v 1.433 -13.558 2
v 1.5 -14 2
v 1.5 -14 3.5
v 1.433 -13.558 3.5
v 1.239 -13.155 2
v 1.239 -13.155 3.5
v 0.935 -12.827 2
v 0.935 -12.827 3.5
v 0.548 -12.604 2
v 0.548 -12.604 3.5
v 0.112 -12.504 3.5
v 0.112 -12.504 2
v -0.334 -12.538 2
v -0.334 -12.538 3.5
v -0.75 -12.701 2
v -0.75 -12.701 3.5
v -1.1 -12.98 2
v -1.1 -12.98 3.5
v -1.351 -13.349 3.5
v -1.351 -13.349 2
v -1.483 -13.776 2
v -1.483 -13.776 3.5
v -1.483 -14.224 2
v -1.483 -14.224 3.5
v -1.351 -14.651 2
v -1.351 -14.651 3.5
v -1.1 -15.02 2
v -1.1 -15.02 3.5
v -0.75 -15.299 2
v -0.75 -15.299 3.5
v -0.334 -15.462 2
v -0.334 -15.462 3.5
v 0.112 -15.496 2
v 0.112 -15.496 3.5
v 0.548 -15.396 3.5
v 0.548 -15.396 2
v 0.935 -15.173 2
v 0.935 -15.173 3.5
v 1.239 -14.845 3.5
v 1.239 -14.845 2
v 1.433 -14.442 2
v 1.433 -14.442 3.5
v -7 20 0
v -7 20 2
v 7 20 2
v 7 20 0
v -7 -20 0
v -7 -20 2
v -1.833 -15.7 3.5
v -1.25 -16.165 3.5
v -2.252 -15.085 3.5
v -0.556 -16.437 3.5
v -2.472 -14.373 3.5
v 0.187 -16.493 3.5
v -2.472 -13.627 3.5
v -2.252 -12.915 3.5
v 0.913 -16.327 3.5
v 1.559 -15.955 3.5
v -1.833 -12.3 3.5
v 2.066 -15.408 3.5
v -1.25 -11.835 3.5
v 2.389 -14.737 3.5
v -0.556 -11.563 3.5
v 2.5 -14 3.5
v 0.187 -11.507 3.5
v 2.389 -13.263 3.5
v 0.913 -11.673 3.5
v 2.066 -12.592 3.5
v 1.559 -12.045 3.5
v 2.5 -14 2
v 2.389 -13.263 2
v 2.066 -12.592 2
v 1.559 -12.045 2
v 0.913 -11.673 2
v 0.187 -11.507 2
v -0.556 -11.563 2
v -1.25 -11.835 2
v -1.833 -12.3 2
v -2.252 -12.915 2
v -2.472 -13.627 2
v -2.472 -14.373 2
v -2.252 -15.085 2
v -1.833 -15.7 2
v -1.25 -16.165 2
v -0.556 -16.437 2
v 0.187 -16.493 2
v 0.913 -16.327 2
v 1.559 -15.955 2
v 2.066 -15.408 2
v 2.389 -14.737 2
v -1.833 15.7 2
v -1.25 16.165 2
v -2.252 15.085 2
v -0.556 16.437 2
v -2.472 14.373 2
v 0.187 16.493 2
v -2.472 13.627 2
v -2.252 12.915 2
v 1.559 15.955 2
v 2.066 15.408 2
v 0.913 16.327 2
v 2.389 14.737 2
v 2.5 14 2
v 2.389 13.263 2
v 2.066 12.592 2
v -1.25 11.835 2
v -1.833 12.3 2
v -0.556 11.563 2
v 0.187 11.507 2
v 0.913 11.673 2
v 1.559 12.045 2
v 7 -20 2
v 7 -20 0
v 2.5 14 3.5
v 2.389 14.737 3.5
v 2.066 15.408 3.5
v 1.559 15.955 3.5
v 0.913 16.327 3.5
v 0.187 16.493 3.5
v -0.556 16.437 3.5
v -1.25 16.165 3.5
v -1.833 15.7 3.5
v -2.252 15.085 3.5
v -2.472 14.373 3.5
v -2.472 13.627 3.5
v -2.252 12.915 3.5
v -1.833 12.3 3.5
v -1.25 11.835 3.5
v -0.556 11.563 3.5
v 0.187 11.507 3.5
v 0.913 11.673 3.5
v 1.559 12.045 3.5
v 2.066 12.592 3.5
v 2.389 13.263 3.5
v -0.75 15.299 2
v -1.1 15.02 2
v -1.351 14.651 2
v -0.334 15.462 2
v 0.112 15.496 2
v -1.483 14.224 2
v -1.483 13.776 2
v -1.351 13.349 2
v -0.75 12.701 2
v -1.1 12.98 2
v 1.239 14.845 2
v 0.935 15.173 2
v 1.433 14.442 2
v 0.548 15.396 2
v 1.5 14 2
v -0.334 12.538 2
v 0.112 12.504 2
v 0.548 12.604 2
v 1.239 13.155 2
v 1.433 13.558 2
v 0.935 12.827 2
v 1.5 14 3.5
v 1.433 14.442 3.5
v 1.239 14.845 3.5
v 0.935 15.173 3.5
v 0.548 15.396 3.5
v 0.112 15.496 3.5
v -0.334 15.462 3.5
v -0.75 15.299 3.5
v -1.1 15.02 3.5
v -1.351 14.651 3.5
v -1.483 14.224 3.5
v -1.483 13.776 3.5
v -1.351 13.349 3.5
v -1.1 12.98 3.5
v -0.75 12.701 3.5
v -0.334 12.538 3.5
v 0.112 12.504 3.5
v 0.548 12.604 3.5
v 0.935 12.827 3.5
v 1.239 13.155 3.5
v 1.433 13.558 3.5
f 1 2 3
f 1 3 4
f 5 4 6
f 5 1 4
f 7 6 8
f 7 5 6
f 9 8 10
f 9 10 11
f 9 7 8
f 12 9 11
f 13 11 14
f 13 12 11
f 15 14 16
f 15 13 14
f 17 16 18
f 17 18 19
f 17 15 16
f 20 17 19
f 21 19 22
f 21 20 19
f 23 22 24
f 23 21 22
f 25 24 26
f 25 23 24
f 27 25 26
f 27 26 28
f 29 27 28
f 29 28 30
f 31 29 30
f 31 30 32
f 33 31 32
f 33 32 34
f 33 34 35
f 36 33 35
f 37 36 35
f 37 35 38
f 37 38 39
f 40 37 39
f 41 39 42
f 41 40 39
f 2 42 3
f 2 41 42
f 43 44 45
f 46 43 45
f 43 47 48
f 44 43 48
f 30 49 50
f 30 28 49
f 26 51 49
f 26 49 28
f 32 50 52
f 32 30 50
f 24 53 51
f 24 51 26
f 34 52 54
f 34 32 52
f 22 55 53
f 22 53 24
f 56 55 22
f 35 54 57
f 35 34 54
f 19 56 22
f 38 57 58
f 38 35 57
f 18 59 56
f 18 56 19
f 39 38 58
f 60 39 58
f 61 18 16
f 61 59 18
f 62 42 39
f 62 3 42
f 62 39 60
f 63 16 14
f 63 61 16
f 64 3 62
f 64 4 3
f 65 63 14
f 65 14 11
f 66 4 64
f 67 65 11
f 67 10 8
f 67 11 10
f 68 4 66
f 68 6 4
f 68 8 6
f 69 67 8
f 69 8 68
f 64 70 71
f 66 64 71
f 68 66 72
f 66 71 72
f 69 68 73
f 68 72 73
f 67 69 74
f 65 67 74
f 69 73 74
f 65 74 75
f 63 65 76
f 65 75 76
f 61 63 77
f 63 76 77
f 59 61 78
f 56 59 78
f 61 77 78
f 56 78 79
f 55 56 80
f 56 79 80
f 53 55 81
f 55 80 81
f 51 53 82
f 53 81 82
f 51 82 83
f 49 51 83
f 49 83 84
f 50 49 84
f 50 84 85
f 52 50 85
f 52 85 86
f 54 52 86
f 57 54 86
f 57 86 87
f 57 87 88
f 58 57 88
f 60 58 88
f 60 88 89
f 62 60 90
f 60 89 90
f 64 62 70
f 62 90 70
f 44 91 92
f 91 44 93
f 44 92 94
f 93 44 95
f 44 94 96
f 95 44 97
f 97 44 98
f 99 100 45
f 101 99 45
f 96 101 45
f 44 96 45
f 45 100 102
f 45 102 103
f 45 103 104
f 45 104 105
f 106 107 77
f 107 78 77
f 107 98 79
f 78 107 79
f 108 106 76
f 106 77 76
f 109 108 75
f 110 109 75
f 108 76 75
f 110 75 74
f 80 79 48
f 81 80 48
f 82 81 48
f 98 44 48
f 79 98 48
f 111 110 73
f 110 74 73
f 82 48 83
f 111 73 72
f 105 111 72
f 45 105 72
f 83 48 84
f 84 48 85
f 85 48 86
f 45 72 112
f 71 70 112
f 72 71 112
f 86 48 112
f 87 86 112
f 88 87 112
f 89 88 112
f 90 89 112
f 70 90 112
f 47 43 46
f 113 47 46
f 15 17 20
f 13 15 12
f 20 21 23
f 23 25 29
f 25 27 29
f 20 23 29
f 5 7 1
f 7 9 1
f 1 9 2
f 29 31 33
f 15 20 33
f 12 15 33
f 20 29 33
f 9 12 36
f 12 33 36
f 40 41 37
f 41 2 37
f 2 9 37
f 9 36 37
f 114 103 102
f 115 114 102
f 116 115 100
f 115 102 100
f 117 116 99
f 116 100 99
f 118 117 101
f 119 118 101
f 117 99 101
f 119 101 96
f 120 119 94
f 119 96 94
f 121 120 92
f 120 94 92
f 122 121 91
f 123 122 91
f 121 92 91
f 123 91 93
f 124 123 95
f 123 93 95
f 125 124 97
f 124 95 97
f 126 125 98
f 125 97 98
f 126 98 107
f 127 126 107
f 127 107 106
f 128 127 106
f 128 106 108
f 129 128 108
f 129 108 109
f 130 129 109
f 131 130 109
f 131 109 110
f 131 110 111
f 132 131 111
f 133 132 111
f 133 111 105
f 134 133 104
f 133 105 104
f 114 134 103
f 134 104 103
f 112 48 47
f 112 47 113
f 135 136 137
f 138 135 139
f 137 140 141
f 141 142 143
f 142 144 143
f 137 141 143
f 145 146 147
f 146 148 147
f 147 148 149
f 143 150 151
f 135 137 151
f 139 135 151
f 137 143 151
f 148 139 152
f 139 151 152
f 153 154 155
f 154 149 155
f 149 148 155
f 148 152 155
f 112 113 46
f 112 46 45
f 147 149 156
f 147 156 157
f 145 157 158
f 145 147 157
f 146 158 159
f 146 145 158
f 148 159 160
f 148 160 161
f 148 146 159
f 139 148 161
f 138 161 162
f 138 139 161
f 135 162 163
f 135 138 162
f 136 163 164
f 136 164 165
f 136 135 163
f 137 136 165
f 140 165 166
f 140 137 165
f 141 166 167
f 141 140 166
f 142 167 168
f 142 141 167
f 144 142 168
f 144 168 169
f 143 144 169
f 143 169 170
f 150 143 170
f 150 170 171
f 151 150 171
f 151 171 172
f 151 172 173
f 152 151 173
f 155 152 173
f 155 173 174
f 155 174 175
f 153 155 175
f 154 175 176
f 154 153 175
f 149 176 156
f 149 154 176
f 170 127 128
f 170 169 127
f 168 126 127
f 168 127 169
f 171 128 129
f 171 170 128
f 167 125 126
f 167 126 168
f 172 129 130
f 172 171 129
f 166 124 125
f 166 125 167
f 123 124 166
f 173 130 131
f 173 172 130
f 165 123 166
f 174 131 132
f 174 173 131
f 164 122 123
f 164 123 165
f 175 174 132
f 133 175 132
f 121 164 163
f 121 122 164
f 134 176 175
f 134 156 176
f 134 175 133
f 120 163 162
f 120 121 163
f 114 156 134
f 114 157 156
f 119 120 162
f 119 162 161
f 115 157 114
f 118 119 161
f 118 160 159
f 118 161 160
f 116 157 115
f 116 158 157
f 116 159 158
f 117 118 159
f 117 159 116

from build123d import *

# Parameters (mm, degrees)
F0_W          = 14
F0_H          = 2
F1_DEPTH      = 20
F1_DEPTH_BACK = 20
F2_R          = 2.5
F2_R_2        = 1.5
F3_DEPTH      = 1.5


with BuildPart() as f1:
    # F0 (on Front) → F1 (new body, two sides)
    with BuildSketch(Plane.XZ) as f1_sk:
        with Locations((0, 1)):
            Rectangle(F0_W, F0_H)
    extrude(amount=F1_DEPTH)
    extrude(f1_sk.sketch, amount=-F1_DEPTH_BACK)

    # F2 (on face) → F3 (join)
    with BuildSketch(Plane.XY.offset(2)):
        with Locations((0, 14)):
            Circle(F2_R)
        with Locations((0, 14)):
            Circle(F2_R_2, mode=Mode.SUBTRACT)
        with Locations((0, -14)):
            Circle(F2_R)
        with Locations((0, -14)):
            Circle(F2_R_2, mode=Mode.SUBTRACT)
    extrude(amount=F3_DEPTH)


solid = f1.part
